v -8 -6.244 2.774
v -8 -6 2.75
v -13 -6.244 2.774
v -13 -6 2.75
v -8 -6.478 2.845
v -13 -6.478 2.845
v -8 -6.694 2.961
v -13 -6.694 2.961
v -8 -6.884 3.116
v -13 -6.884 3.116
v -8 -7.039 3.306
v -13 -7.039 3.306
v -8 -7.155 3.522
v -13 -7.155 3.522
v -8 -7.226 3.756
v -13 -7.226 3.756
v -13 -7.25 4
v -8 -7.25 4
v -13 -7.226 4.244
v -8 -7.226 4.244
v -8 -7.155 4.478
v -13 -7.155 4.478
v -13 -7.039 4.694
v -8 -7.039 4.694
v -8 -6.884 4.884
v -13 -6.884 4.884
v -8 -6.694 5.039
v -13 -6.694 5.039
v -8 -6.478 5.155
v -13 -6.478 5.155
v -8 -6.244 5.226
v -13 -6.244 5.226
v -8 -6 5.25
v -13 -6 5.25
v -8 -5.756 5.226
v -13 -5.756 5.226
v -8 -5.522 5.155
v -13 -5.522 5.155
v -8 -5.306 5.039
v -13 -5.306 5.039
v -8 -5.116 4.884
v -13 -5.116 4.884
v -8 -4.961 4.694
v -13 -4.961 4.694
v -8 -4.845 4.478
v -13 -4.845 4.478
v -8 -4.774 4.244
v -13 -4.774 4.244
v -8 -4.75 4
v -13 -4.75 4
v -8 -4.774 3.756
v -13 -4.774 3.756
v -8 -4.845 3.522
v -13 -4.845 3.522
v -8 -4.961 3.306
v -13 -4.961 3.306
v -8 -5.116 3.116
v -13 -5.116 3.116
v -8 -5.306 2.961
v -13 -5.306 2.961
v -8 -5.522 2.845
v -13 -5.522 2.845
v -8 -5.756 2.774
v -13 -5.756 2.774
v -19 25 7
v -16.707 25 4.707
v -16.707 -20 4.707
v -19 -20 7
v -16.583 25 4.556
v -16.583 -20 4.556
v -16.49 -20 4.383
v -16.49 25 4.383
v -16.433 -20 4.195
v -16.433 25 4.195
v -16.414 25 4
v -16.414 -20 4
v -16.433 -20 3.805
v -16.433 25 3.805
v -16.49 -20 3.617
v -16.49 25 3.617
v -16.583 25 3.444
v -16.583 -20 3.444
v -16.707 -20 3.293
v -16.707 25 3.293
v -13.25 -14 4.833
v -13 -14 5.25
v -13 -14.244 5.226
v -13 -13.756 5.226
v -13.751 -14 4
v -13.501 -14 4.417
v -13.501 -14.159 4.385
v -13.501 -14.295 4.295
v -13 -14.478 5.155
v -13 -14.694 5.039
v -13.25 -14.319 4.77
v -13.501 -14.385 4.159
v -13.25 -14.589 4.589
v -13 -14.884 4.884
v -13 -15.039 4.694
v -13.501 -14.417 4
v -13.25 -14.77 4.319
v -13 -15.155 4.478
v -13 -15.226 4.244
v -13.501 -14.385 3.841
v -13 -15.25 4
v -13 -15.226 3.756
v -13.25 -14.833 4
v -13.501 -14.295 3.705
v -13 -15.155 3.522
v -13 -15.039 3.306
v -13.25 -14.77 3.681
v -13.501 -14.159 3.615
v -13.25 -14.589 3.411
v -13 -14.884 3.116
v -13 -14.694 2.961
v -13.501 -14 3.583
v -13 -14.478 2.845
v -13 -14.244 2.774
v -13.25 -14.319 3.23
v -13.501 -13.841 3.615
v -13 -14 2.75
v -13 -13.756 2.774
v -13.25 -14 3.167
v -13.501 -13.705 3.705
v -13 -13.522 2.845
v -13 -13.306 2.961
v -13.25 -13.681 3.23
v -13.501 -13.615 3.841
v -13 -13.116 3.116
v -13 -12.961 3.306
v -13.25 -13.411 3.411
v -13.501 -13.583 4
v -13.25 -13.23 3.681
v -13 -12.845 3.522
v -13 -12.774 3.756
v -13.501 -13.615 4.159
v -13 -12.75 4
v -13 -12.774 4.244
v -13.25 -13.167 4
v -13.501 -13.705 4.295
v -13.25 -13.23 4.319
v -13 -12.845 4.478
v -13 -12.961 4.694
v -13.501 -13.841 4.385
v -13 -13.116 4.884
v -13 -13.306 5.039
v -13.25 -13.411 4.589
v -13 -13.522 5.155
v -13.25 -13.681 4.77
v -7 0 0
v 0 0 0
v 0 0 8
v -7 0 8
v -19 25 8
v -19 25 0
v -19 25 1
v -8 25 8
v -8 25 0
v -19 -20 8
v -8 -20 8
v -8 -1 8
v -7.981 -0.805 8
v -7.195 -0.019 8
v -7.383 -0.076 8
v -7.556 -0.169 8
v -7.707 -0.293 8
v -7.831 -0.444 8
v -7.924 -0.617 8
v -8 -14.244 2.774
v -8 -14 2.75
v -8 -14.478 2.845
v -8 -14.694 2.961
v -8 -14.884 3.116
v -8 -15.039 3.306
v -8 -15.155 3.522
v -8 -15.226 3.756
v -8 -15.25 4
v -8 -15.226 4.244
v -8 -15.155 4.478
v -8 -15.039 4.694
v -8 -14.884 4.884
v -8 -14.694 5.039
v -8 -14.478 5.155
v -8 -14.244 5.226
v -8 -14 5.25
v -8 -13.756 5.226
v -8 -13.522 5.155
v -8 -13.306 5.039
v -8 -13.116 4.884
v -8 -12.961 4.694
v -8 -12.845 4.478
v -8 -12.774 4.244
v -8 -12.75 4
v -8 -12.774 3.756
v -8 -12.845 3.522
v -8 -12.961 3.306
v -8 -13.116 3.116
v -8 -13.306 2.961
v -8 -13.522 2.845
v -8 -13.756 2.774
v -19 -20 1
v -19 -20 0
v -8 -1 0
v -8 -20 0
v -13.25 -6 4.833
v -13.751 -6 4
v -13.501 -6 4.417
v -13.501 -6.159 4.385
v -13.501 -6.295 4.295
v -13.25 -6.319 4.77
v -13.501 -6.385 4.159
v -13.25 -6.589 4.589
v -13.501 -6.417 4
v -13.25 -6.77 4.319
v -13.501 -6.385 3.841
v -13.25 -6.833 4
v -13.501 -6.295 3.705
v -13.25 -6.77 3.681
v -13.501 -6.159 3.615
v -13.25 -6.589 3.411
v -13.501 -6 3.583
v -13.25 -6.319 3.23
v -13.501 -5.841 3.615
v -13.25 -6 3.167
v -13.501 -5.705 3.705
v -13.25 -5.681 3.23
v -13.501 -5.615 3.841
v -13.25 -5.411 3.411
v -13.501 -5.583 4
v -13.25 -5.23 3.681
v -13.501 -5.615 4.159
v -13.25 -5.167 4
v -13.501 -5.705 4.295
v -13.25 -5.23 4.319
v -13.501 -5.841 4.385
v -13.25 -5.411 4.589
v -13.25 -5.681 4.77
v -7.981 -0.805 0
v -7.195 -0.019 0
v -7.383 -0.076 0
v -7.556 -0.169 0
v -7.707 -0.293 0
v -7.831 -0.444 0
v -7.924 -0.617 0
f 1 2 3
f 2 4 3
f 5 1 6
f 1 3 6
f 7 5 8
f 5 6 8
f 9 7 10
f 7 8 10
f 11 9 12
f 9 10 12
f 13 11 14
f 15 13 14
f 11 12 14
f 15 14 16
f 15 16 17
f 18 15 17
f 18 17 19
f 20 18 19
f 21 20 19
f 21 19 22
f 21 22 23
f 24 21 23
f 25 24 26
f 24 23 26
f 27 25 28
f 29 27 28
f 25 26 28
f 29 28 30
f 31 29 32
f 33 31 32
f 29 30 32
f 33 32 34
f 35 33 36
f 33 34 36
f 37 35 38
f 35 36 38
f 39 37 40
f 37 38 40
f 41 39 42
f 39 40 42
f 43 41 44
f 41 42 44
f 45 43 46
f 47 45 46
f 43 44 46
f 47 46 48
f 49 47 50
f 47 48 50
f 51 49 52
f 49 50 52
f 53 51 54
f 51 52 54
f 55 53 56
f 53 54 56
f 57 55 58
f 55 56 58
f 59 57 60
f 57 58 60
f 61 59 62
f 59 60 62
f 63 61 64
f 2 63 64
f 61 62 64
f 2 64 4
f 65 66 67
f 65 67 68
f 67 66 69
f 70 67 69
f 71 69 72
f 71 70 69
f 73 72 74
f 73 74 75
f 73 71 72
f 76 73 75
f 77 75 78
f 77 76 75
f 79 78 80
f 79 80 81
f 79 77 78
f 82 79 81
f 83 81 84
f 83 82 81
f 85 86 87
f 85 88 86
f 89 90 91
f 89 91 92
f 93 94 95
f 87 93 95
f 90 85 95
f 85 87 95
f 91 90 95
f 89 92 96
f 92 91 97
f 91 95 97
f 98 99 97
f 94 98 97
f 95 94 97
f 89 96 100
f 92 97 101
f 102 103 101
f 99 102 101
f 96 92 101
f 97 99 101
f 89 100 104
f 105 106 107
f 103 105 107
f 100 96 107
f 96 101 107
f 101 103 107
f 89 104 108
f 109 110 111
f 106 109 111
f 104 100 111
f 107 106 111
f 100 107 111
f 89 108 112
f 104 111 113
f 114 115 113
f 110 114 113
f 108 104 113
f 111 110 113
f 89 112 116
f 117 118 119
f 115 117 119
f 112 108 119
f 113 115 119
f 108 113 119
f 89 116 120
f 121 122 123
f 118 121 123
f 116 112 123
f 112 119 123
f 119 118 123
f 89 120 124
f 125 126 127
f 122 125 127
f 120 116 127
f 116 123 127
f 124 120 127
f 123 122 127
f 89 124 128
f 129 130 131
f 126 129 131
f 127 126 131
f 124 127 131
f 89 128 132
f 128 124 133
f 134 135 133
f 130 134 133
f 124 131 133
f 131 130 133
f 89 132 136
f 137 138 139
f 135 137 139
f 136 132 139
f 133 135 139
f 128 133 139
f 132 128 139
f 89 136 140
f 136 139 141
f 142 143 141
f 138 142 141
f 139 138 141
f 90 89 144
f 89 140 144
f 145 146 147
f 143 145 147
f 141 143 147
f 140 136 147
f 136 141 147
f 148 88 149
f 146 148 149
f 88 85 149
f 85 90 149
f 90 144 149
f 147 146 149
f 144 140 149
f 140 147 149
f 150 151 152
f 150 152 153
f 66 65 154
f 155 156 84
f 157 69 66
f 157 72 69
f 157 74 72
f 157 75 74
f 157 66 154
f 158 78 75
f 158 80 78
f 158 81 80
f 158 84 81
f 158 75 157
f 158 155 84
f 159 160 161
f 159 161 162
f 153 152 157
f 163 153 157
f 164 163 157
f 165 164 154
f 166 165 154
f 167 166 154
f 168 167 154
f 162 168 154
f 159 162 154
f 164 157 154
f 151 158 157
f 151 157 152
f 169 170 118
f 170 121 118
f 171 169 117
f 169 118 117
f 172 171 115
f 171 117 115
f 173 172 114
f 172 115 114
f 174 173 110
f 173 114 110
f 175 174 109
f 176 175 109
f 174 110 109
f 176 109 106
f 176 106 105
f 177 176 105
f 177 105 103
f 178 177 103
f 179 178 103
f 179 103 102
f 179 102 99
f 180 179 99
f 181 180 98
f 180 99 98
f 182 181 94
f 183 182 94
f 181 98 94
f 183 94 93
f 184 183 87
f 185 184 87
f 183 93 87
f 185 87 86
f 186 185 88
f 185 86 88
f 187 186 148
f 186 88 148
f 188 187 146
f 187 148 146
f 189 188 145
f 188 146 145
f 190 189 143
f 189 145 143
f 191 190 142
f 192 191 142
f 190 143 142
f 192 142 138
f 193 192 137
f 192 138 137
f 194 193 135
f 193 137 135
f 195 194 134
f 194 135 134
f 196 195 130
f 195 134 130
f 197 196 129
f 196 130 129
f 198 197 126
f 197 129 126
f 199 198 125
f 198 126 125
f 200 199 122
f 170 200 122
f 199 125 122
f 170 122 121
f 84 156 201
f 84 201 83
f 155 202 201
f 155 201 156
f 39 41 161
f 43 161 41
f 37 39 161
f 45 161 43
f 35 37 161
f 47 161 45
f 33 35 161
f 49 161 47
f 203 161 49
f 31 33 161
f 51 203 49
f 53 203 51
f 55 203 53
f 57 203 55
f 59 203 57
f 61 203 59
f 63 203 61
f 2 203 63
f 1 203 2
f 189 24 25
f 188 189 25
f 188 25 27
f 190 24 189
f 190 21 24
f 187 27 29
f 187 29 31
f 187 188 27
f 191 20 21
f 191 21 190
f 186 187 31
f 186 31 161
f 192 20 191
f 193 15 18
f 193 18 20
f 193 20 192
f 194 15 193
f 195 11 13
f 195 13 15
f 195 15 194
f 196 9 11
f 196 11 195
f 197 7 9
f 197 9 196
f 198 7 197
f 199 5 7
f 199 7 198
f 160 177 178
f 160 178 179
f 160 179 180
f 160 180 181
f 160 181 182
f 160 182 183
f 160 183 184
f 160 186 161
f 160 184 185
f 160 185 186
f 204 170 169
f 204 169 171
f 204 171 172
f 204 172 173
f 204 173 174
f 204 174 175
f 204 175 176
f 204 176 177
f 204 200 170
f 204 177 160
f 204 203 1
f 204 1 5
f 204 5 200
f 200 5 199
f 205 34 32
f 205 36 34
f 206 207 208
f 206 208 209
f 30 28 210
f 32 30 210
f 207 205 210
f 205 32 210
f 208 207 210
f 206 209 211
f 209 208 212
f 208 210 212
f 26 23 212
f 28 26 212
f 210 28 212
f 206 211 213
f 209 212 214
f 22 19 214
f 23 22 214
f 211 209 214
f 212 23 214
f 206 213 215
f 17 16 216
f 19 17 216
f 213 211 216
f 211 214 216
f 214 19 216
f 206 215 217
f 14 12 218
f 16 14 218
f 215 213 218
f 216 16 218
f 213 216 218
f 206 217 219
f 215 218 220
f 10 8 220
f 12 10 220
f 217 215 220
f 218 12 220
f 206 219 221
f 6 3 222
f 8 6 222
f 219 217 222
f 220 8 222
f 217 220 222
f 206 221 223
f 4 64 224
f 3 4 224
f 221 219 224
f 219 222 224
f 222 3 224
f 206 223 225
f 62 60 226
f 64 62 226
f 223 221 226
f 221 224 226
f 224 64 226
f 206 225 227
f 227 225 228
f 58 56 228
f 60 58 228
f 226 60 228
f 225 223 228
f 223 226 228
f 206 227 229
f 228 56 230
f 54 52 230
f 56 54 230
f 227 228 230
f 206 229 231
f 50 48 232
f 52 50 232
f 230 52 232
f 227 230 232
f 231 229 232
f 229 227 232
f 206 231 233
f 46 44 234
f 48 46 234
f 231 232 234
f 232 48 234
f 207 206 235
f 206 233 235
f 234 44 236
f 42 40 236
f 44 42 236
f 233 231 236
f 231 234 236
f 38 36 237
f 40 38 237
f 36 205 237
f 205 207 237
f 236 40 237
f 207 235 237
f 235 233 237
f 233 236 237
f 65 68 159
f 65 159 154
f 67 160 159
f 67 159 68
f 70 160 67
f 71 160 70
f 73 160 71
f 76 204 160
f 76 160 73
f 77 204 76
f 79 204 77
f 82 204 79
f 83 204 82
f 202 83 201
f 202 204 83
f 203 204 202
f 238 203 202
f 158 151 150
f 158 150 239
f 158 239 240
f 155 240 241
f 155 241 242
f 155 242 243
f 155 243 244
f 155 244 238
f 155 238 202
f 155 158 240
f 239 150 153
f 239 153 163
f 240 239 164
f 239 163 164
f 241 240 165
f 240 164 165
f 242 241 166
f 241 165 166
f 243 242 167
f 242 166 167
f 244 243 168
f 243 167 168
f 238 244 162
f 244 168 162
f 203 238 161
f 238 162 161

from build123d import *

# Parameters (mm, degrees)
BOSS_EXTRUDE1_DEPTH       = 8
CUT_EXTRUDE1_DEPTH        = 46
M3X0_5_TAPPED_HOLE1_D     = 2.5
M3X0_5_TAPPED_HOLE1_DEPTH = 5
M3X0_5_TAPPED_HOLE1_TIP   = 0.751075774
FILLET1_R                 = 1
FILLET2_R                 = 1


with BuildPart() as part:
    # Sketch1 → Boss-Extrude1 (new body)
    with BuildSketch(Plane.XY):
        Polygon((0, 0), (-8, 0), (-8, -20), (-19, -20), (-19, 25), (-8, 25), align=None)
    extrude(amount=BOSS_EXTRUDE1_DEPTH)

    # Sketch2 → Cut-Extrude1 (cut, through all)
    with BuildSketch(Plane(origin=(0, 25, 0), x_dir=(1, 0, 0), z_dir=(0, 1, 0))):
        Polygon((-19, -4), (-19, -1), (-16, -4), (-19, -7), align=None)
    extrude(amount=-CUT_EXTRUDE1_DEPTH, mode=Mode.SUBTRACT)

    # M3x0.5 Tapped Hole1
    with Locations(Plane(origin=(-8, -6, 4), x_dir=(0, 0, 1), z_dir=(1, 0, 0))):
        with Locations((0, 0), (0, 8)):
            Hole(M3X0_5_TAPPED_HOLE1_D / 2, depth=M3X0_5_TAPPED_HOLE1_DEPTH)
            with Locations((0, 0, -(M3X0_5_TAPPED_HOLE1_DEPTH + M3X0_5_TAPPED_HOLE1_TIP / 2))):  # 118° drill point
                Cone(0, M3X0_5_TAPPED_HOLE1_D / 2, M3X0_5_TAPPED_HOLE1_TIP, mode=Mode.SUBTRACT)

    # Fillet1
    fillet1_edges = [part.edges().sort_by_distance(p)[0] for p in [
        (-16, 2.5, 4),
    ]]
    fillet(fillet1_edges, radius=FILLET1_R)

    # Fillet2
    fillet2_edges = [part.edges().sort_by_distance(p)[0] for p in [
        (-8, 0, 4),
    ]]
    fillet(fillet2_edges, radius=FILLET2_R)


solid = part.part
